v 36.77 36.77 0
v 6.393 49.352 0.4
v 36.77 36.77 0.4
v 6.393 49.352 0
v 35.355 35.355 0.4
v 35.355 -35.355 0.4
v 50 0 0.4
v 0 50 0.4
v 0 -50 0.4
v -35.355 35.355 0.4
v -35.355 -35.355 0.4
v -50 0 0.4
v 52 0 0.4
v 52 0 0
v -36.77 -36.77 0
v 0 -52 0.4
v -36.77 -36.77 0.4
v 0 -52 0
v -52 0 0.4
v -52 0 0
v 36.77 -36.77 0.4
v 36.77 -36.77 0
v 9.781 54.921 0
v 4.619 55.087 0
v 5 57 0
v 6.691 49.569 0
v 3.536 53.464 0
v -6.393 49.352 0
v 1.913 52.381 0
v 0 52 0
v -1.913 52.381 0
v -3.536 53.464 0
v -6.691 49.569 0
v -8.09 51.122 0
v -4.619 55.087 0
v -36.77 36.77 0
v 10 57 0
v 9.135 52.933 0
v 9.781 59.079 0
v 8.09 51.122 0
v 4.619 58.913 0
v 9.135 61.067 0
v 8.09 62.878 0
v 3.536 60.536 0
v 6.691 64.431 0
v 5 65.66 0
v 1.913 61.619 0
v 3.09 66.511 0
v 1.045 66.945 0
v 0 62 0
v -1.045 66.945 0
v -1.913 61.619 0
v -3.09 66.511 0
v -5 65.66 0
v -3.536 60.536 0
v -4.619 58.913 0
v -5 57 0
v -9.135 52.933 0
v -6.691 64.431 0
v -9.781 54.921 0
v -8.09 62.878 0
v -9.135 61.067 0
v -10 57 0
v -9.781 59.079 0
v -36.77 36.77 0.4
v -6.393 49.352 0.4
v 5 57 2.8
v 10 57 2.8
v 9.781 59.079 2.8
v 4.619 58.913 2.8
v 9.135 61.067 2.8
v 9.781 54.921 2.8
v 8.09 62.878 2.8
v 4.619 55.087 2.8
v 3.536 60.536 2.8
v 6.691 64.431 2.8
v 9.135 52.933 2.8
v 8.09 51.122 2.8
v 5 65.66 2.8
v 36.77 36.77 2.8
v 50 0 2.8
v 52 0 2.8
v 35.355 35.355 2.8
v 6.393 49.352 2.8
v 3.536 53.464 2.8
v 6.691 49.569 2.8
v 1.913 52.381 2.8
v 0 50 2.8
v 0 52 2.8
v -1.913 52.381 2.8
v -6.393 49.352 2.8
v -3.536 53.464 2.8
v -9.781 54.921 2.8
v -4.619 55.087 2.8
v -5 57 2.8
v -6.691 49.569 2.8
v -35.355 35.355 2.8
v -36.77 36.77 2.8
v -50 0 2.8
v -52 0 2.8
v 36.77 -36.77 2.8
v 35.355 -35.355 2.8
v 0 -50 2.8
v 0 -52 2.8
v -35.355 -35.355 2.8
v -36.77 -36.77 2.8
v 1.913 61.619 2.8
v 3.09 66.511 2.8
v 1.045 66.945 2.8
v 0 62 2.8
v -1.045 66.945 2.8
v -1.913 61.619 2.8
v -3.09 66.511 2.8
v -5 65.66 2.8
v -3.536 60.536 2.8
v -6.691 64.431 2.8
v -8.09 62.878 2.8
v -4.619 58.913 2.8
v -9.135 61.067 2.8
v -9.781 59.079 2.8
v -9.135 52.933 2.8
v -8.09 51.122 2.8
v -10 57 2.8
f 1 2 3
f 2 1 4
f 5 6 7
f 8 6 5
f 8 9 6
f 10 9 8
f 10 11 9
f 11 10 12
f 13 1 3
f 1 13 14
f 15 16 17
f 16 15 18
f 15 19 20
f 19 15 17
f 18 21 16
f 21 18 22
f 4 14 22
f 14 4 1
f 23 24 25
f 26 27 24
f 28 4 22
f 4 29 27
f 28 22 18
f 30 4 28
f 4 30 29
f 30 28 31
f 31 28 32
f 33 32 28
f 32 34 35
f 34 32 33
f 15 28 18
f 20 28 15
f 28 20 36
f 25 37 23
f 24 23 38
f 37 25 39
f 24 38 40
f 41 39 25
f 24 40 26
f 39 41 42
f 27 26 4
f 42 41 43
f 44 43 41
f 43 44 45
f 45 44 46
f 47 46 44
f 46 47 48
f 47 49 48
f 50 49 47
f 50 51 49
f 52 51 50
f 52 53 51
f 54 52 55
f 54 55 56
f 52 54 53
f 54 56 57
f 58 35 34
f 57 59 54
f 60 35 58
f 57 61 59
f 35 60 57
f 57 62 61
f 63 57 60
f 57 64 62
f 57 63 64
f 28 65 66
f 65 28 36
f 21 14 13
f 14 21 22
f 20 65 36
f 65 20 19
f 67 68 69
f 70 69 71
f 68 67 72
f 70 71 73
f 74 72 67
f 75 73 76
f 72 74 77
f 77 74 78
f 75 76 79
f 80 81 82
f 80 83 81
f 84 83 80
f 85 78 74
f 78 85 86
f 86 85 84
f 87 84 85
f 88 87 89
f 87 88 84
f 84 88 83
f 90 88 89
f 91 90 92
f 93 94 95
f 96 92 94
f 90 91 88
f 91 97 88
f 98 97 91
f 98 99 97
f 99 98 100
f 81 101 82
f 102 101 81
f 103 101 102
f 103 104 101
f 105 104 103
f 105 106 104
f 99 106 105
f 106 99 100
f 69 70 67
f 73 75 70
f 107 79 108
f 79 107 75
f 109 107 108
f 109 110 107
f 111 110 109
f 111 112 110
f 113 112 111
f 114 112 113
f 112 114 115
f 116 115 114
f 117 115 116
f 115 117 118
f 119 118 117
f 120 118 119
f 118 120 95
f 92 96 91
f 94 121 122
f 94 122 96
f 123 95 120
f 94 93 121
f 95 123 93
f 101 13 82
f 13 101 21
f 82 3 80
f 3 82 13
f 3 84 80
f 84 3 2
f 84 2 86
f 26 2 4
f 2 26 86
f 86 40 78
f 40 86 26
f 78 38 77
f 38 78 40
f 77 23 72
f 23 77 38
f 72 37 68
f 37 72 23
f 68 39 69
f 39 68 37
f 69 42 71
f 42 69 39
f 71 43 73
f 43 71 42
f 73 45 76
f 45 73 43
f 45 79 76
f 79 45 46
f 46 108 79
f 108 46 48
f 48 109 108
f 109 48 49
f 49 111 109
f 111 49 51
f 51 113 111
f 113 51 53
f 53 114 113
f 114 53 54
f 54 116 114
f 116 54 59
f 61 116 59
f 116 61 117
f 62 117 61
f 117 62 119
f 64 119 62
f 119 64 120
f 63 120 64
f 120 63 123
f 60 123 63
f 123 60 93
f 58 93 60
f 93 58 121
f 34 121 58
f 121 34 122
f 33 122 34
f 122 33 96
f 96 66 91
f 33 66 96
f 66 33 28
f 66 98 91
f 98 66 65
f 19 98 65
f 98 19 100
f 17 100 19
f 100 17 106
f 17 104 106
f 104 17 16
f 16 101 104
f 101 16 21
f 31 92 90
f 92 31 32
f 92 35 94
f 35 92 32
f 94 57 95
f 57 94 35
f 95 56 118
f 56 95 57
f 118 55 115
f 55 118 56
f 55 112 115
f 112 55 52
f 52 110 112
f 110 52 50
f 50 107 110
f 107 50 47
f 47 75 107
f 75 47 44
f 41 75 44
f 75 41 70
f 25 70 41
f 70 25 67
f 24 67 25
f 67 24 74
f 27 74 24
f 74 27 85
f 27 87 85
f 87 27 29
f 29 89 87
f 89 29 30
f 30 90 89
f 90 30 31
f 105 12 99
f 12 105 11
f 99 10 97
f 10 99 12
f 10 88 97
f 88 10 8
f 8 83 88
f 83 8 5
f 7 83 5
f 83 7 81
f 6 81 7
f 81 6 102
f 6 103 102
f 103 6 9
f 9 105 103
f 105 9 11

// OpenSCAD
// preview[view:south, tilt:top]

/* [Image] */

// Load a 100x100 pixel image.(images will be stretched to fit) Simple photos work best. Don't forget to click the Invert Colors checkbox!
image_file = "image-surface.dat"; // [image_surface:100x100]

/* [Adjustments] */

hole_diameter = 10;

// What layer height will you slice this at?  The thinner the better.
layer_height = 0.2;

// The lower the layer height, the more layers you can use.
number_of_layers = 12; // [5:20]

//detail
detail=8; //[8,10,12,24,48,96]

/* [Hidden] */

length = 100;
width = 100;
// base (white) will always be 2 layers thick
min_layer_height = layer_height*2;
hole_radius = hole_diameter/2;
height = layer_height*number_of_layers;

union() {
intersection() {
//union() {
  // take just the part of surface we want
  difference() {
    translate([0, 0, min_layer_height]) scale([1,1,height]) surface(file=image_file, center=true, convexity=5);
    translate([0,0,-(height+min_layer_height)]) linear_extrude(height=height+min_layer_height) circle(r=length/2, center=true,$fn=detail);
  }
//  linear_extrude(height=layer_height*2) circle(r=(length+4)/2, center=true);

  //linear_extrude(height=height+min_layer_height){
//	  difference(){
//		union(){
//	      circle(r=(length+4)/2,center=true);
//		  translate([0, width/2+hole_radius+2, 0])
//		    circle(r=hole_radius+5);
//		}
//	    union(){
//	      circle(r=length/2, center=true);
//		  translate([0, width/2+hole_radius+2, 0])
//	        circle(r=hole_radius);
//	    }
//	  }
//  }
//}
cylinder(r=(length+4)/2,h=40,center=false,$fn=detail);
				}
 linear_extrude(height=layer_height*2) circle(r=(length+4)/2, center=true,$fn=detail);
linear_extrude(height=height+min_layer_height)
			{
difference(){
		union(){
	      circle(r=(length+4)/2,center=true,$fn=detail);
		  translate([0, width/2+hole_radius+2, 0])
		    circle(r=hole_radius+5);
				}
	    union(){
	      circle(r=length/2, center=true,$fn=detail);
		  translate([0, width/2+hole_radius+2, 0])
	        circle(r=hole_radius);
	   			 }
	 		 }
			}
		}
